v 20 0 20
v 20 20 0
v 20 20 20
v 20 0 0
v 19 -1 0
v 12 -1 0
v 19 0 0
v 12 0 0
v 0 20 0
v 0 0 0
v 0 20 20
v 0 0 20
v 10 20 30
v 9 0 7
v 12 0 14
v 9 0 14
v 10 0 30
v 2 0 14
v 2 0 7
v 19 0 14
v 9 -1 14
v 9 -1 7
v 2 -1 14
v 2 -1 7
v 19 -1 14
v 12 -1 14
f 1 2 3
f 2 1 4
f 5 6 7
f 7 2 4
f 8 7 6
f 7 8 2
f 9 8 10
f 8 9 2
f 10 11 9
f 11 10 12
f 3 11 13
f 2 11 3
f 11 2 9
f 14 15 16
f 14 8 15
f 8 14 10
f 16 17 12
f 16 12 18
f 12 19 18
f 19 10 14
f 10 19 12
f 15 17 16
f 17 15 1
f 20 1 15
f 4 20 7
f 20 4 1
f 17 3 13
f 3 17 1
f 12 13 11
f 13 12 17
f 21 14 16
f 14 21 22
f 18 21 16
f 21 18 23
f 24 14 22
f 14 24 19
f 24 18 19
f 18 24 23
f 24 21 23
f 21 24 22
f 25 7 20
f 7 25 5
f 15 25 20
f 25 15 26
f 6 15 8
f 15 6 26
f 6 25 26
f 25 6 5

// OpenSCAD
cube(20);

color("green")
translate([0,20,20])
rotate([90,0,0])
linear_extrude(height = 20, center = false, convexity = 10, twist = 0)
polygon(points=[[0,0],[20,0],[10,10]], paths=[[0,1,2]]); //triangulo

color("red")
translate([2,-1,7])
cube([7,2,7]);

color("blue")
translate([12,-1,0])
cube([7,2,14]);

//$fa = 0.01;
//sphere(30);
